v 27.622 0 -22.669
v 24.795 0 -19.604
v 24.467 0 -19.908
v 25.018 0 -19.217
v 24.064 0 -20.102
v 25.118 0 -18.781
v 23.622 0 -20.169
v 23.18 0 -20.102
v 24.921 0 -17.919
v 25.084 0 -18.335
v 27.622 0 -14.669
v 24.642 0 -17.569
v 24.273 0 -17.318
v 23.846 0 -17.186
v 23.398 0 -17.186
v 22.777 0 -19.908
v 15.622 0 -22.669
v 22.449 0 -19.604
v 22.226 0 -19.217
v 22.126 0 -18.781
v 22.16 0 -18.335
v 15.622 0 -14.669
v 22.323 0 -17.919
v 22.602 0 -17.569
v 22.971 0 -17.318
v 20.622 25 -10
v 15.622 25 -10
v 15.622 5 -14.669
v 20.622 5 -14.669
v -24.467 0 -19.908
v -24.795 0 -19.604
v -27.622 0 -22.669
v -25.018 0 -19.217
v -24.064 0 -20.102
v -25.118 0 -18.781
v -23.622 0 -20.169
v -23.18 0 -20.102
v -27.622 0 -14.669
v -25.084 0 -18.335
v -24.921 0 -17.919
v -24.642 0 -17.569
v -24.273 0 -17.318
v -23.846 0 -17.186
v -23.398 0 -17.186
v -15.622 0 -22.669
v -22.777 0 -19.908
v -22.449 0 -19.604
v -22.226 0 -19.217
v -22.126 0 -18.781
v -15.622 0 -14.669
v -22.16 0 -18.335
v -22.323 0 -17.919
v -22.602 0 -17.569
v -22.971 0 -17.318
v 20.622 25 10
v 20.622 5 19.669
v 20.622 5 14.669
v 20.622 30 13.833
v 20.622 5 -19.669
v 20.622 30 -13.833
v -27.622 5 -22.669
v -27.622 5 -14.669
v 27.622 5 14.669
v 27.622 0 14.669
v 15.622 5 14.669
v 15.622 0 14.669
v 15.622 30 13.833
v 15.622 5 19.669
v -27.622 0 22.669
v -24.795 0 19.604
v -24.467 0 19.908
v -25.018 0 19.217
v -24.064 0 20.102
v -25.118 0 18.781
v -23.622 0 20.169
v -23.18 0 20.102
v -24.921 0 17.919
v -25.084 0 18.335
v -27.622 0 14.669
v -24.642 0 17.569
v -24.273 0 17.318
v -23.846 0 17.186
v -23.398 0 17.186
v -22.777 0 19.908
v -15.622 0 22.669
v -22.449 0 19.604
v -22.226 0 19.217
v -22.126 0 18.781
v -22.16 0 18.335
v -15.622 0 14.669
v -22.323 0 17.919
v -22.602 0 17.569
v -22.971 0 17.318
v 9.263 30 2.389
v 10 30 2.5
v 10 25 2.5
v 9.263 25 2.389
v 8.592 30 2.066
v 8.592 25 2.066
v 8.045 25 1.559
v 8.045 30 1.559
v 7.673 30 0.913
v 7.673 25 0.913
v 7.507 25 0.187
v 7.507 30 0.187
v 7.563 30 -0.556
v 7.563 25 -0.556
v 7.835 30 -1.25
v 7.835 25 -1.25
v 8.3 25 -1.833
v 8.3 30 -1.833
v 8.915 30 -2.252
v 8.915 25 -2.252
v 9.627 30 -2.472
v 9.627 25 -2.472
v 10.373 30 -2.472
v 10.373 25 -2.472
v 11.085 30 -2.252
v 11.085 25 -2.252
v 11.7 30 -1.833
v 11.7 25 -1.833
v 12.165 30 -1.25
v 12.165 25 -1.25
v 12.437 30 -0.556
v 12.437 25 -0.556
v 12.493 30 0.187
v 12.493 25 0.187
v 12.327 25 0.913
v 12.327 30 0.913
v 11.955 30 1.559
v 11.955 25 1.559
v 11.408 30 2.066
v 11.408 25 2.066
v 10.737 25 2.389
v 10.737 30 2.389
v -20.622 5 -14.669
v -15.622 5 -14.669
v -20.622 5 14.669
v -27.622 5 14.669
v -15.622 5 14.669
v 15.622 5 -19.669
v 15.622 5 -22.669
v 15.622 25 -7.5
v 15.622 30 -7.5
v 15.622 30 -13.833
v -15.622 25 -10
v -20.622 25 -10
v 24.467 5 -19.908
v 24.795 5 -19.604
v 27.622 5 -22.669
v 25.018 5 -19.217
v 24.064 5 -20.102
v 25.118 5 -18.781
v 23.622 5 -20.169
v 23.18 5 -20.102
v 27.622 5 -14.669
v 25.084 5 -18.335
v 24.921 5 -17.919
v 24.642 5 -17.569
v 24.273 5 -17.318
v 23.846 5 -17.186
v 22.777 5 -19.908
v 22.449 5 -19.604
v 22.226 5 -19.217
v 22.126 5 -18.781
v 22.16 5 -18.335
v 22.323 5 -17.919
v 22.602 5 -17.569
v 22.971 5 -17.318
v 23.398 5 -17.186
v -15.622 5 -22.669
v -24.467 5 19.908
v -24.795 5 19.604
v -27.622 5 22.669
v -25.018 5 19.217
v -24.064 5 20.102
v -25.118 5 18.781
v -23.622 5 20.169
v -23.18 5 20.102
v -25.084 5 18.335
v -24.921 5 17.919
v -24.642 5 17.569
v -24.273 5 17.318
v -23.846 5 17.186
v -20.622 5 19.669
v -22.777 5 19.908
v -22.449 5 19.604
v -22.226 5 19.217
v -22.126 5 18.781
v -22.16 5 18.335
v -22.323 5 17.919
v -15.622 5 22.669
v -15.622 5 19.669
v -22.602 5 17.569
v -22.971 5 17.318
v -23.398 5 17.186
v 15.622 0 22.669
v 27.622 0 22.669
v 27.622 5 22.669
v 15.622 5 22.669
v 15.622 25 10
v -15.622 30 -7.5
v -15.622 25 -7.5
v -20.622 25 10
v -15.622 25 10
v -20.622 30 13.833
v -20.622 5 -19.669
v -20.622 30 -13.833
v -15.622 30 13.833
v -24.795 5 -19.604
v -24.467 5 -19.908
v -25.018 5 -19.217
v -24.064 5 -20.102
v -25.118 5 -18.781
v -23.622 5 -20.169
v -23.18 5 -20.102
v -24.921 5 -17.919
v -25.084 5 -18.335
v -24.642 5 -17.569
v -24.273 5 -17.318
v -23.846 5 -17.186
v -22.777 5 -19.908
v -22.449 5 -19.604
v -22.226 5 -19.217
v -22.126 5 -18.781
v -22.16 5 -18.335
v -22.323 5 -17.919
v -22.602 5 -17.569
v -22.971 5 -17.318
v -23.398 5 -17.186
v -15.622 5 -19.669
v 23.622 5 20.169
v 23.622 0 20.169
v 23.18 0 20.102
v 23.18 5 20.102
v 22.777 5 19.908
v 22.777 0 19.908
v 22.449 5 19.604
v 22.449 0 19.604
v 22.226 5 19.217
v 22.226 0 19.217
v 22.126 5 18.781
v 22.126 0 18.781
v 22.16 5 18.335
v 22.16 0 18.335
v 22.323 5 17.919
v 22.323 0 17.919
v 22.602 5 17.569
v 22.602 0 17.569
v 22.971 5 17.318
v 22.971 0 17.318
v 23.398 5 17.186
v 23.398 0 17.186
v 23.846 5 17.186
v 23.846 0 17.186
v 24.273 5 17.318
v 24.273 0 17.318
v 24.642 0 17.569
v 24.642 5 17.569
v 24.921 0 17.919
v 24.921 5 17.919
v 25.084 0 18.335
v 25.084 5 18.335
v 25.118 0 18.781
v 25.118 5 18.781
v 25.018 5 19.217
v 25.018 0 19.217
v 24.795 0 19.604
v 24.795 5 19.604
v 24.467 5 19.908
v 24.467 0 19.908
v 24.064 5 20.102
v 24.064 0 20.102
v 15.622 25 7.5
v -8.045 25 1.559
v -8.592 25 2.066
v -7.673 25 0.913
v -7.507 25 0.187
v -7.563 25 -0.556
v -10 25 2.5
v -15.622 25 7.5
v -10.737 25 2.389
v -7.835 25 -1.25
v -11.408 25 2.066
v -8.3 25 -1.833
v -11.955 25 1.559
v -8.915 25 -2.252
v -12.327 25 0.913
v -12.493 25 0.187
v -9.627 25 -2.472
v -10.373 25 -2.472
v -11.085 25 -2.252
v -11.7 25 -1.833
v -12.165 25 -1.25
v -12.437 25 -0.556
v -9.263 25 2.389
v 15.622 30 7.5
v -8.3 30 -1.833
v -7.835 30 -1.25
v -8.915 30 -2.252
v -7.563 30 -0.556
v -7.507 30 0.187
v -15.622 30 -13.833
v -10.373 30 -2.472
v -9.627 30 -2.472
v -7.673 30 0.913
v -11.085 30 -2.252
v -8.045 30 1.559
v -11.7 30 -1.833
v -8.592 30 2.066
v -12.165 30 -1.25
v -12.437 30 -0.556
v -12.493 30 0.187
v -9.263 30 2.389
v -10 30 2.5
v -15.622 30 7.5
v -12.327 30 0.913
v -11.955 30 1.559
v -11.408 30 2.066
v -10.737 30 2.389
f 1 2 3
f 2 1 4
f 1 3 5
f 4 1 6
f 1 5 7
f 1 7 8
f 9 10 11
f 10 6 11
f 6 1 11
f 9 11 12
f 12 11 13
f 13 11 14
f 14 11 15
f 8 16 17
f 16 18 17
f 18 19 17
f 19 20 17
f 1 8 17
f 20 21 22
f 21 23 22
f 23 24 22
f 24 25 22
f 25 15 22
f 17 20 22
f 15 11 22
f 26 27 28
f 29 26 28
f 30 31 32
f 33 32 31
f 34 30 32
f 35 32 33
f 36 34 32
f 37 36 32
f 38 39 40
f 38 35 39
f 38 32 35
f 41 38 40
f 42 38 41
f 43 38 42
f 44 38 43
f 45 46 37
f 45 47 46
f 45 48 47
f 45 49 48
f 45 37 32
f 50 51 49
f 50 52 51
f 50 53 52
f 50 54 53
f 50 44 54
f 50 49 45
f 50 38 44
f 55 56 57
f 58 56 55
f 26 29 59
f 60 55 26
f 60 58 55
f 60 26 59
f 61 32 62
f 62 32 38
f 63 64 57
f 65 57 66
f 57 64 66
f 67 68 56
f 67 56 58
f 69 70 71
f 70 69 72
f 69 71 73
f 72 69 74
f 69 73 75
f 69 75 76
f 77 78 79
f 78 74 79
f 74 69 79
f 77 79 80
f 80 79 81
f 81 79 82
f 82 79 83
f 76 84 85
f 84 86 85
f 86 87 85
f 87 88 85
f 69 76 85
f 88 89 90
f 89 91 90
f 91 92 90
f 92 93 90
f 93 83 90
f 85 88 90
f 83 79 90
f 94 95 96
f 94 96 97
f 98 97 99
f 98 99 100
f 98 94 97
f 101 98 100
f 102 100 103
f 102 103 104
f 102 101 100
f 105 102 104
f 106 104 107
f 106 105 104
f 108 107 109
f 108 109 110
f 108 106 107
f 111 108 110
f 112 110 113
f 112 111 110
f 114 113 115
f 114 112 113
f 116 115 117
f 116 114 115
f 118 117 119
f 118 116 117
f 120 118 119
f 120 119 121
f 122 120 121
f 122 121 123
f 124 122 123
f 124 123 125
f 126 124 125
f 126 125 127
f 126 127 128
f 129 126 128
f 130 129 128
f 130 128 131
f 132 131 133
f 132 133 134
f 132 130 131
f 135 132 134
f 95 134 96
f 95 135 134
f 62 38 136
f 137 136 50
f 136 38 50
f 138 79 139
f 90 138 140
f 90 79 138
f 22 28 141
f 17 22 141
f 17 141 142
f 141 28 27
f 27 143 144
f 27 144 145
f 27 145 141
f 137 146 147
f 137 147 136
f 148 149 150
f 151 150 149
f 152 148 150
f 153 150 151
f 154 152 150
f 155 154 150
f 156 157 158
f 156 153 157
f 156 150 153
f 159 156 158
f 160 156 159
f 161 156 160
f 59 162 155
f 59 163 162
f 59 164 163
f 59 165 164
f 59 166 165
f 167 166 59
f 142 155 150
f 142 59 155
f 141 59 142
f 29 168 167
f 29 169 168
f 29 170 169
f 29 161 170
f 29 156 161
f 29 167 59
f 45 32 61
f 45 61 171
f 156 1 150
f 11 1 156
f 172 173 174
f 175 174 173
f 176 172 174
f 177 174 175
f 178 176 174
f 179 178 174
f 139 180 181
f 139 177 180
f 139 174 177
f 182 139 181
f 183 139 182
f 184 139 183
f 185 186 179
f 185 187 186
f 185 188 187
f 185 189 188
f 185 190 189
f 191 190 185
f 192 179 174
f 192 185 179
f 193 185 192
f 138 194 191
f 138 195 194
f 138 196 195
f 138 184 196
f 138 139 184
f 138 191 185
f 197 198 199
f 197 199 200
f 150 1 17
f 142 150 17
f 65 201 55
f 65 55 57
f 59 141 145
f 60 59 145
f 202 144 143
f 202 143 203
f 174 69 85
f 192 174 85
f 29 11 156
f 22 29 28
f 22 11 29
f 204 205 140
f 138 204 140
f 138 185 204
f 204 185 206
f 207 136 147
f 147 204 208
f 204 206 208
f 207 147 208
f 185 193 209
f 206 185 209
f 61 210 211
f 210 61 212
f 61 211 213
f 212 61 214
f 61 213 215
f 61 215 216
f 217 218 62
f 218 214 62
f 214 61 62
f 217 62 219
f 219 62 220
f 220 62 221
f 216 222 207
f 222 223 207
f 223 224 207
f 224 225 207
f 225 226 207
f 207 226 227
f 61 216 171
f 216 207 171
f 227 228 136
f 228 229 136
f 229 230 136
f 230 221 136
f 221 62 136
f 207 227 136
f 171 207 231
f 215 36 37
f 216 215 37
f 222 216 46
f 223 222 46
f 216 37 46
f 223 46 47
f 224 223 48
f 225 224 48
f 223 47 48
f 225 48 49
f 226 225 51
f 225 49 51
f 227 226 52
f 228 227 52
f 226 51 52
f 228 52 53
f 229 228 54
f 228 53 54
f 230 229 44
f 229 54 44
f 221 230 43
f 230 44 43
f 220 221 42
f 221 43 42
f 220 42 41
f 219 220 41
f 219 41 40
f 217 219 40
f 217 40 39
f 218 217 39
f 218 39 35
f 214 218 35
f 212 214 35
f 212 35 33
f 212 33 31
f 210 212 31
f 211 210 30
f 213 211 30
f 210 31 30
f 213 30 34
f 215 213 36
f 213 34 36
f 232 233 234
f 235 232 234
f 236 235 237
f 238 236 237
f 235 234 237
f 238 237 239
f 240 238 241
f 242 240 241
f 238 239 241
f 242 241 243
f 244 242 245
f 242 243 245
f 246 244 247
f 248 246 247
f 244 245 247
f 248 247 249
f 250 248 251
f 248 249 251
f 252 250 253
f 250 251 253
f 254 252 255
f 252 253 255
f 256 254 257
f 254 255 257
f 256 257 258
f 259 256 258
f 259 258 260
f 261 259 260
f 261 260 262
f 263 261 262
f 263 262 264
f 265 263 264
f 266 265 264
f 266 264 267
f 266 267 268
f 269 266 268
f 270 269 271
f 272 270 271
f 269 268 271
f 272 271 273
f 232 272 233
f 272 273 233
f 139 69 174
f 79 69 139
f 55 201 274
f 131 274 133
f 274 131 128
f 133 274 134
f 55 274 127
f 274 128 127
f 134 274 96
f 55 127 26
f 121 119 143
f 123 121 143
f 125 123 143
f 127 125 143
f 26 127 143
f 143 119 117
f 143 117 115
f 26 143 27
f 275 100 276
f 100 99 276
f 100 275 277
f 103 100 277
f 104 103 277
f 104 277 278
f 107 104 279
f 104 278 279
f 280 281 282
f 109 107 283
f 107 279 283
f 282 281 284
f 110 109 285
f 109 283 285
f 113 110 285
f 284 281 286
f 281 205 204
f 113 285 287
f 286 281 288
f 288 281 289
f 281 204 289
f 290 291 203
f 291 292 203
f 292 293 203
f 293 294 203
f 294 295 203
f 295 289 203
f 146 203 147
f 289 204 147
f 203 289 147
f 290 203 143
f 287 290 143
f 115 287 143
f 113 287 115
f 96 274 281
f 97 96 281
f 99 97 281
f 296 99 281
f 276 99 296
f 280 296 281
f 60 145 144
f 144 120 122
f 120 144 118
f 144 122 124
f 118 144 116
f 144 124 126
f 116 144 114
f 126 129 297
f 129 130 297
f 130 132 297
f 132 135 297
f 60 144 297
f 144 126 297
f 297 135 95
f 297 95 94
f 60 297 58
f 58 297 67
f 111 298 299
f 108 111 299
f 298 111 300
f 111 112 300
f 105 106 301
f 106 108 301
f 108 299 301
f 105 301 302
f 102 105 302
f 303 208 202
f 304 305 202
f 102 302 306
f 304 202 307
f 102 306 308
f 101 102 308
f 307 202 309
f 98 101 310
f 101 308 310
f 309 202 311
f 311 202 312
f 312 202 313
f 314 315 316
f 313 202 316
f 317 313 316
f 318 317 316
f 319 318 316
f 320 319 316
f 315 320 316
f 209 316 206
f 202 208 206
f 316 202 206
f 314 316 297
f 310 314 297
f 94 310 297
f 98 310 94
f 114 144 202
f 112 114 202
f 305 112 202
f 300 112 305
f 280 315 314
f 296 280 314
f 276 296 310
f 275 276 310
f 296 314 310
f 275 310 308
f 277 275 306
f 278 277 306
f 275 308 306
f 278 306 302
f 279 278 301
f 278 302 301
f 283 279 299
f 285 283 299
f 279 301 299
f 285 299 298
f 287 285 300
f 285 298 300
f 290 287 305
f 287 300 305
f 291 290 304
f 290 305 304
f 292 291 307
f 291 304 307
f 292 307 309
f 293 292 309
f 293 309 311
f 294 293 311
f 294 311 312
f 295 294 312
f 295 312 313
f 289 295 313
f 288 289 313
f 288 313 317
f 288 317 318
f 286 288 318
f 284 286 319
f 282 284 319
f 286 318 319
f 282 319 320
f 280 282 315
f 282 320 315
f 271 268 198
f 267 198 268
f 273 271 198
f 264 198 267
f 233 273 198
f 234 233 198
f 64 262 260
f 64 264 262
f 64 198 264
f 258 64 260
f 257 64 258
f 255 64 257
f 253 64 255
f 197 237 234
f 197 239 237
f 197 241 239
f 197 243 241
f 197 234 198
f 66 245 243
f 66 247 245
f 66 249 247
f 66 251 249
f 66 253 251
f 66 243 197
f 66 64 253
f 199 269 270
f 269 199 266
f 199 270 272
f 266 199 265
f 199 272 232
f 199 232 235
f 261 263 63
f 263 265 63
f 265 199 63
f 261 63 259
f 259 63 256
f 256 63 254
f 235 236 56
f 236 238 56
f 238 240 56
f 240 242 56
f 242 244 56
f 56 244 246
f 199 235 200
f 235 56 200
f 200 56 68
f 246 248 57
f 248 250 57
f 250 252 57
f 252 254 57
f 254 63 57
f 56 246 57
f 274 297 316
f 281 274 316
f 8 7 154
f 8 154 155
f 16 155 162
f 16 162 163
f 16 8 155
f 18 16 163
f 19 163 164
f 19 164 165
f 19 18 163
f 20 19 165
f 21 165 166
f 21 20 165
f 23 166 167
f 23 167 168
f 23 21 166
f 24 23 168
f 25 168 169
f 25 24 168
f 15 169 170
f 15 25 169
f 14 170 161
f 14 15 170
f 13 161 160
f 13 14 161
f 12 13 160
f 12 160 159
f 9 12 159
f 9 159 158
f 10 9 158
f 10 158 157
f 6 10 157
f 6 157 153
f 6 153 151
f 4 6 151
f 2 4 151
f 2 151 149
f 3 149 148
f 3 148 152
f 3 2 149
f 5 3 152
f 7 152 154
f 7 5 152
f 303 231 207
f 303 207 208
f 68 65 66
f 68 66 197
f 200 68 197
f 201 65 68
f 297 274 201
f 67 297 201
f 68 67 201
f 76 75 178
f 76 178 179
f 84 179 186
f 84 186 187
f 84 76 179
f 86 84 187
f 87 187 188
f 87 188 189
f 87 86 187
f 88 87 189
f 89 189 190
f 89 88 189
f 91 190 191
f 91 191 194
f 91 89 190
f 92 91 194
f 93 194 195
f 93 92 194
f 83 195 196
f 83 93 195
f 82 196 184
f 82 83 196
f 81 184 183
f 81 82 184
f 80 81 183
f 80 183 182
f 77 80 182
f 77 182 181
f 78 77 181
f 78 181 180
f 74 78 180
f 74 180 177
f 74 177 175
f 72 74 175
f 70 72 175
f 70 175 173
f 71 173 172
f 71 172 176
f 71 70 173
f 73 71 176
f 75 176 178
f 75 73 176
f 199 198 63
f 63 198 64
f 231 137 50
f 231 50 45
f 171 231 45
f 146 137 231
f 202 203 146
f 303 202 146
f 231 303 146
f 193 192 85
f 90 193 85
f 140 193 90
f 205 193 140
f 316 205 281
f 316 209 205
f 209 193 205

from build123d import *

# Parameters (mm, degrees)
SKETCH_1_W               = 12
SKETCH_1_H               = 8
SKETCH_1_R               = 1.5
EXTRUDE_1_DEPTH          = 5
EXTRUDE_2_DEPTH          = 5
SKETCH_3_W               = 15.622
SKETCH_3_H               = 15
SKETCH_3_R               = 2.5
EXTRUDE_3_DEPTH          = 5
MIRROR_5_COPY_1_SKETCH_W = 12
MIRROR_5_COPY_1_SKETCH_H = 8
MIRROR_5_COPY_1_SKETCH_R = 1.5
MIRROR_5_COPY_1_DEPTH    = 5
MIRROR_5_COPY_2_DEPTH    = 5


with BuildPart() as part:
    # 草图1 → 凸台-拉伸1 (new body)
    with BuildSketch(Plane(origin=(0, 0, 0), x_dir=(1, 0, 0), z_dir=(0, 1, 0))):
        with Locations((-21.622, -18.669)):
            Rectangle(SKETCH_1_W, SKETCH_1_H)
        with Locations(Location((-23.622, -18.669, 0), (0, 0, 270))):
            Circle(SKETCH_1_R, mode=Mode.SUBTRACT)
    extrude_1 = extrude(amount=EXTRUDE_1_DEPTH)

    # 草图2 → 凸台-拉伸2 (add)
    with BuildSketch(Plane(origin=(-15.622, 0, 0), x_dir=(0, 0, -1), z_dir=(1, 0, 0))):
        Polygon((-10, 25), (-14.669, 5), (-14.669, 0), (-19.669, 0), (-19.669, 5), (-13.83275, 30), (0, 30), (0, 25), align=None)
    extrude_2 = extrude(amount=-EXTRUDE_2_DEPTH)

    # 镜向4: 凸台-拉伸1, 凸台-拉伸2 across plane
    add(extrude_1.mirror(Plane.XY))
    add(extrude_2.mirror(Plane.XY))

    # 草图3 → 凸台-拉伸3 (add)
    with BuildSketch(Plane(origin=(0, 30, 0), x_dir=(1, 0, 0), z_dir=(0, 1, 0))):
        with Locations((-7.811, 0)):
            Rectangle(SKETCH_3_W, SKETCH_3_H)
        with Locations(Location((-10, 0, 0), (0, 0, 270))):
            Circle(SKETCH_3_R, mode=Mode.SUBTRACT)
    extrude_3 = extrude(amount=-EXTRUDE_3_DEPTH)

    # 镜向5: 凸台-拉伸1, 凸台-拉伸2, 凸台-拉伸3 across plane
    add(extrude_1.mirror(Plane(origin=(0, 0, 0), x_dir=(0, 0, 1), z_dir=(1, 0, 0))))
    add(extrude_2.mirror(Plane(origin=(0, 0, 0), x_dir=(0, 0, 1), z_dir=(1, 0, 0))))
    add(extrude_3.mirror(Plane(origin=(0, 0, 0), x_dir=(0, 0, 1), z_dir=(1, 0, 0))))



with BuildPart() as body_2:
    # 镜向5 copy 1 sketch → 镜向5 copy 1 (new body)
    with BuildSketch(Plane(origin=(0, 0, 0), x_dir=(-1, 0, 0), z_dir=(0, 1, 0))):
        with Locations((-21.622, -18.669)):
            Rectangle(MIRROR_5_COPY_1_SKETCH_W, MIRROR_5_COPY_1_SKETCH_H)
        with Locations(Location((-23.622, -18.669, 0), (0, 0, 270))):
            Circle(MIRROR_5_COPY_1_SKETCH_R, mode=Mode.SUBTRACT)
    extrude(amount=MIRROR_5_COPY_1_DEPTH)


with BuildPart() as part_1:
    add(part.part)

    add(body_2.part)  # 镜向5 copy 2 merges body 2
    # 镜向5 copy 2 sketch → 镜向5 copy 2 (add)
    with BuildSketch(Plane.ZY.offset(-15.622)):
        Polygon((-10, 25), (-14.669, 5), (-14.669, 0), (-19.669, 0), (-19.669, 5), (-13.83275, 30), (0, 30), (0, 25), align=None)
    extrude(amount=-MIRROR_5_COPY_2_DEPTH)


solid = part_1.part
